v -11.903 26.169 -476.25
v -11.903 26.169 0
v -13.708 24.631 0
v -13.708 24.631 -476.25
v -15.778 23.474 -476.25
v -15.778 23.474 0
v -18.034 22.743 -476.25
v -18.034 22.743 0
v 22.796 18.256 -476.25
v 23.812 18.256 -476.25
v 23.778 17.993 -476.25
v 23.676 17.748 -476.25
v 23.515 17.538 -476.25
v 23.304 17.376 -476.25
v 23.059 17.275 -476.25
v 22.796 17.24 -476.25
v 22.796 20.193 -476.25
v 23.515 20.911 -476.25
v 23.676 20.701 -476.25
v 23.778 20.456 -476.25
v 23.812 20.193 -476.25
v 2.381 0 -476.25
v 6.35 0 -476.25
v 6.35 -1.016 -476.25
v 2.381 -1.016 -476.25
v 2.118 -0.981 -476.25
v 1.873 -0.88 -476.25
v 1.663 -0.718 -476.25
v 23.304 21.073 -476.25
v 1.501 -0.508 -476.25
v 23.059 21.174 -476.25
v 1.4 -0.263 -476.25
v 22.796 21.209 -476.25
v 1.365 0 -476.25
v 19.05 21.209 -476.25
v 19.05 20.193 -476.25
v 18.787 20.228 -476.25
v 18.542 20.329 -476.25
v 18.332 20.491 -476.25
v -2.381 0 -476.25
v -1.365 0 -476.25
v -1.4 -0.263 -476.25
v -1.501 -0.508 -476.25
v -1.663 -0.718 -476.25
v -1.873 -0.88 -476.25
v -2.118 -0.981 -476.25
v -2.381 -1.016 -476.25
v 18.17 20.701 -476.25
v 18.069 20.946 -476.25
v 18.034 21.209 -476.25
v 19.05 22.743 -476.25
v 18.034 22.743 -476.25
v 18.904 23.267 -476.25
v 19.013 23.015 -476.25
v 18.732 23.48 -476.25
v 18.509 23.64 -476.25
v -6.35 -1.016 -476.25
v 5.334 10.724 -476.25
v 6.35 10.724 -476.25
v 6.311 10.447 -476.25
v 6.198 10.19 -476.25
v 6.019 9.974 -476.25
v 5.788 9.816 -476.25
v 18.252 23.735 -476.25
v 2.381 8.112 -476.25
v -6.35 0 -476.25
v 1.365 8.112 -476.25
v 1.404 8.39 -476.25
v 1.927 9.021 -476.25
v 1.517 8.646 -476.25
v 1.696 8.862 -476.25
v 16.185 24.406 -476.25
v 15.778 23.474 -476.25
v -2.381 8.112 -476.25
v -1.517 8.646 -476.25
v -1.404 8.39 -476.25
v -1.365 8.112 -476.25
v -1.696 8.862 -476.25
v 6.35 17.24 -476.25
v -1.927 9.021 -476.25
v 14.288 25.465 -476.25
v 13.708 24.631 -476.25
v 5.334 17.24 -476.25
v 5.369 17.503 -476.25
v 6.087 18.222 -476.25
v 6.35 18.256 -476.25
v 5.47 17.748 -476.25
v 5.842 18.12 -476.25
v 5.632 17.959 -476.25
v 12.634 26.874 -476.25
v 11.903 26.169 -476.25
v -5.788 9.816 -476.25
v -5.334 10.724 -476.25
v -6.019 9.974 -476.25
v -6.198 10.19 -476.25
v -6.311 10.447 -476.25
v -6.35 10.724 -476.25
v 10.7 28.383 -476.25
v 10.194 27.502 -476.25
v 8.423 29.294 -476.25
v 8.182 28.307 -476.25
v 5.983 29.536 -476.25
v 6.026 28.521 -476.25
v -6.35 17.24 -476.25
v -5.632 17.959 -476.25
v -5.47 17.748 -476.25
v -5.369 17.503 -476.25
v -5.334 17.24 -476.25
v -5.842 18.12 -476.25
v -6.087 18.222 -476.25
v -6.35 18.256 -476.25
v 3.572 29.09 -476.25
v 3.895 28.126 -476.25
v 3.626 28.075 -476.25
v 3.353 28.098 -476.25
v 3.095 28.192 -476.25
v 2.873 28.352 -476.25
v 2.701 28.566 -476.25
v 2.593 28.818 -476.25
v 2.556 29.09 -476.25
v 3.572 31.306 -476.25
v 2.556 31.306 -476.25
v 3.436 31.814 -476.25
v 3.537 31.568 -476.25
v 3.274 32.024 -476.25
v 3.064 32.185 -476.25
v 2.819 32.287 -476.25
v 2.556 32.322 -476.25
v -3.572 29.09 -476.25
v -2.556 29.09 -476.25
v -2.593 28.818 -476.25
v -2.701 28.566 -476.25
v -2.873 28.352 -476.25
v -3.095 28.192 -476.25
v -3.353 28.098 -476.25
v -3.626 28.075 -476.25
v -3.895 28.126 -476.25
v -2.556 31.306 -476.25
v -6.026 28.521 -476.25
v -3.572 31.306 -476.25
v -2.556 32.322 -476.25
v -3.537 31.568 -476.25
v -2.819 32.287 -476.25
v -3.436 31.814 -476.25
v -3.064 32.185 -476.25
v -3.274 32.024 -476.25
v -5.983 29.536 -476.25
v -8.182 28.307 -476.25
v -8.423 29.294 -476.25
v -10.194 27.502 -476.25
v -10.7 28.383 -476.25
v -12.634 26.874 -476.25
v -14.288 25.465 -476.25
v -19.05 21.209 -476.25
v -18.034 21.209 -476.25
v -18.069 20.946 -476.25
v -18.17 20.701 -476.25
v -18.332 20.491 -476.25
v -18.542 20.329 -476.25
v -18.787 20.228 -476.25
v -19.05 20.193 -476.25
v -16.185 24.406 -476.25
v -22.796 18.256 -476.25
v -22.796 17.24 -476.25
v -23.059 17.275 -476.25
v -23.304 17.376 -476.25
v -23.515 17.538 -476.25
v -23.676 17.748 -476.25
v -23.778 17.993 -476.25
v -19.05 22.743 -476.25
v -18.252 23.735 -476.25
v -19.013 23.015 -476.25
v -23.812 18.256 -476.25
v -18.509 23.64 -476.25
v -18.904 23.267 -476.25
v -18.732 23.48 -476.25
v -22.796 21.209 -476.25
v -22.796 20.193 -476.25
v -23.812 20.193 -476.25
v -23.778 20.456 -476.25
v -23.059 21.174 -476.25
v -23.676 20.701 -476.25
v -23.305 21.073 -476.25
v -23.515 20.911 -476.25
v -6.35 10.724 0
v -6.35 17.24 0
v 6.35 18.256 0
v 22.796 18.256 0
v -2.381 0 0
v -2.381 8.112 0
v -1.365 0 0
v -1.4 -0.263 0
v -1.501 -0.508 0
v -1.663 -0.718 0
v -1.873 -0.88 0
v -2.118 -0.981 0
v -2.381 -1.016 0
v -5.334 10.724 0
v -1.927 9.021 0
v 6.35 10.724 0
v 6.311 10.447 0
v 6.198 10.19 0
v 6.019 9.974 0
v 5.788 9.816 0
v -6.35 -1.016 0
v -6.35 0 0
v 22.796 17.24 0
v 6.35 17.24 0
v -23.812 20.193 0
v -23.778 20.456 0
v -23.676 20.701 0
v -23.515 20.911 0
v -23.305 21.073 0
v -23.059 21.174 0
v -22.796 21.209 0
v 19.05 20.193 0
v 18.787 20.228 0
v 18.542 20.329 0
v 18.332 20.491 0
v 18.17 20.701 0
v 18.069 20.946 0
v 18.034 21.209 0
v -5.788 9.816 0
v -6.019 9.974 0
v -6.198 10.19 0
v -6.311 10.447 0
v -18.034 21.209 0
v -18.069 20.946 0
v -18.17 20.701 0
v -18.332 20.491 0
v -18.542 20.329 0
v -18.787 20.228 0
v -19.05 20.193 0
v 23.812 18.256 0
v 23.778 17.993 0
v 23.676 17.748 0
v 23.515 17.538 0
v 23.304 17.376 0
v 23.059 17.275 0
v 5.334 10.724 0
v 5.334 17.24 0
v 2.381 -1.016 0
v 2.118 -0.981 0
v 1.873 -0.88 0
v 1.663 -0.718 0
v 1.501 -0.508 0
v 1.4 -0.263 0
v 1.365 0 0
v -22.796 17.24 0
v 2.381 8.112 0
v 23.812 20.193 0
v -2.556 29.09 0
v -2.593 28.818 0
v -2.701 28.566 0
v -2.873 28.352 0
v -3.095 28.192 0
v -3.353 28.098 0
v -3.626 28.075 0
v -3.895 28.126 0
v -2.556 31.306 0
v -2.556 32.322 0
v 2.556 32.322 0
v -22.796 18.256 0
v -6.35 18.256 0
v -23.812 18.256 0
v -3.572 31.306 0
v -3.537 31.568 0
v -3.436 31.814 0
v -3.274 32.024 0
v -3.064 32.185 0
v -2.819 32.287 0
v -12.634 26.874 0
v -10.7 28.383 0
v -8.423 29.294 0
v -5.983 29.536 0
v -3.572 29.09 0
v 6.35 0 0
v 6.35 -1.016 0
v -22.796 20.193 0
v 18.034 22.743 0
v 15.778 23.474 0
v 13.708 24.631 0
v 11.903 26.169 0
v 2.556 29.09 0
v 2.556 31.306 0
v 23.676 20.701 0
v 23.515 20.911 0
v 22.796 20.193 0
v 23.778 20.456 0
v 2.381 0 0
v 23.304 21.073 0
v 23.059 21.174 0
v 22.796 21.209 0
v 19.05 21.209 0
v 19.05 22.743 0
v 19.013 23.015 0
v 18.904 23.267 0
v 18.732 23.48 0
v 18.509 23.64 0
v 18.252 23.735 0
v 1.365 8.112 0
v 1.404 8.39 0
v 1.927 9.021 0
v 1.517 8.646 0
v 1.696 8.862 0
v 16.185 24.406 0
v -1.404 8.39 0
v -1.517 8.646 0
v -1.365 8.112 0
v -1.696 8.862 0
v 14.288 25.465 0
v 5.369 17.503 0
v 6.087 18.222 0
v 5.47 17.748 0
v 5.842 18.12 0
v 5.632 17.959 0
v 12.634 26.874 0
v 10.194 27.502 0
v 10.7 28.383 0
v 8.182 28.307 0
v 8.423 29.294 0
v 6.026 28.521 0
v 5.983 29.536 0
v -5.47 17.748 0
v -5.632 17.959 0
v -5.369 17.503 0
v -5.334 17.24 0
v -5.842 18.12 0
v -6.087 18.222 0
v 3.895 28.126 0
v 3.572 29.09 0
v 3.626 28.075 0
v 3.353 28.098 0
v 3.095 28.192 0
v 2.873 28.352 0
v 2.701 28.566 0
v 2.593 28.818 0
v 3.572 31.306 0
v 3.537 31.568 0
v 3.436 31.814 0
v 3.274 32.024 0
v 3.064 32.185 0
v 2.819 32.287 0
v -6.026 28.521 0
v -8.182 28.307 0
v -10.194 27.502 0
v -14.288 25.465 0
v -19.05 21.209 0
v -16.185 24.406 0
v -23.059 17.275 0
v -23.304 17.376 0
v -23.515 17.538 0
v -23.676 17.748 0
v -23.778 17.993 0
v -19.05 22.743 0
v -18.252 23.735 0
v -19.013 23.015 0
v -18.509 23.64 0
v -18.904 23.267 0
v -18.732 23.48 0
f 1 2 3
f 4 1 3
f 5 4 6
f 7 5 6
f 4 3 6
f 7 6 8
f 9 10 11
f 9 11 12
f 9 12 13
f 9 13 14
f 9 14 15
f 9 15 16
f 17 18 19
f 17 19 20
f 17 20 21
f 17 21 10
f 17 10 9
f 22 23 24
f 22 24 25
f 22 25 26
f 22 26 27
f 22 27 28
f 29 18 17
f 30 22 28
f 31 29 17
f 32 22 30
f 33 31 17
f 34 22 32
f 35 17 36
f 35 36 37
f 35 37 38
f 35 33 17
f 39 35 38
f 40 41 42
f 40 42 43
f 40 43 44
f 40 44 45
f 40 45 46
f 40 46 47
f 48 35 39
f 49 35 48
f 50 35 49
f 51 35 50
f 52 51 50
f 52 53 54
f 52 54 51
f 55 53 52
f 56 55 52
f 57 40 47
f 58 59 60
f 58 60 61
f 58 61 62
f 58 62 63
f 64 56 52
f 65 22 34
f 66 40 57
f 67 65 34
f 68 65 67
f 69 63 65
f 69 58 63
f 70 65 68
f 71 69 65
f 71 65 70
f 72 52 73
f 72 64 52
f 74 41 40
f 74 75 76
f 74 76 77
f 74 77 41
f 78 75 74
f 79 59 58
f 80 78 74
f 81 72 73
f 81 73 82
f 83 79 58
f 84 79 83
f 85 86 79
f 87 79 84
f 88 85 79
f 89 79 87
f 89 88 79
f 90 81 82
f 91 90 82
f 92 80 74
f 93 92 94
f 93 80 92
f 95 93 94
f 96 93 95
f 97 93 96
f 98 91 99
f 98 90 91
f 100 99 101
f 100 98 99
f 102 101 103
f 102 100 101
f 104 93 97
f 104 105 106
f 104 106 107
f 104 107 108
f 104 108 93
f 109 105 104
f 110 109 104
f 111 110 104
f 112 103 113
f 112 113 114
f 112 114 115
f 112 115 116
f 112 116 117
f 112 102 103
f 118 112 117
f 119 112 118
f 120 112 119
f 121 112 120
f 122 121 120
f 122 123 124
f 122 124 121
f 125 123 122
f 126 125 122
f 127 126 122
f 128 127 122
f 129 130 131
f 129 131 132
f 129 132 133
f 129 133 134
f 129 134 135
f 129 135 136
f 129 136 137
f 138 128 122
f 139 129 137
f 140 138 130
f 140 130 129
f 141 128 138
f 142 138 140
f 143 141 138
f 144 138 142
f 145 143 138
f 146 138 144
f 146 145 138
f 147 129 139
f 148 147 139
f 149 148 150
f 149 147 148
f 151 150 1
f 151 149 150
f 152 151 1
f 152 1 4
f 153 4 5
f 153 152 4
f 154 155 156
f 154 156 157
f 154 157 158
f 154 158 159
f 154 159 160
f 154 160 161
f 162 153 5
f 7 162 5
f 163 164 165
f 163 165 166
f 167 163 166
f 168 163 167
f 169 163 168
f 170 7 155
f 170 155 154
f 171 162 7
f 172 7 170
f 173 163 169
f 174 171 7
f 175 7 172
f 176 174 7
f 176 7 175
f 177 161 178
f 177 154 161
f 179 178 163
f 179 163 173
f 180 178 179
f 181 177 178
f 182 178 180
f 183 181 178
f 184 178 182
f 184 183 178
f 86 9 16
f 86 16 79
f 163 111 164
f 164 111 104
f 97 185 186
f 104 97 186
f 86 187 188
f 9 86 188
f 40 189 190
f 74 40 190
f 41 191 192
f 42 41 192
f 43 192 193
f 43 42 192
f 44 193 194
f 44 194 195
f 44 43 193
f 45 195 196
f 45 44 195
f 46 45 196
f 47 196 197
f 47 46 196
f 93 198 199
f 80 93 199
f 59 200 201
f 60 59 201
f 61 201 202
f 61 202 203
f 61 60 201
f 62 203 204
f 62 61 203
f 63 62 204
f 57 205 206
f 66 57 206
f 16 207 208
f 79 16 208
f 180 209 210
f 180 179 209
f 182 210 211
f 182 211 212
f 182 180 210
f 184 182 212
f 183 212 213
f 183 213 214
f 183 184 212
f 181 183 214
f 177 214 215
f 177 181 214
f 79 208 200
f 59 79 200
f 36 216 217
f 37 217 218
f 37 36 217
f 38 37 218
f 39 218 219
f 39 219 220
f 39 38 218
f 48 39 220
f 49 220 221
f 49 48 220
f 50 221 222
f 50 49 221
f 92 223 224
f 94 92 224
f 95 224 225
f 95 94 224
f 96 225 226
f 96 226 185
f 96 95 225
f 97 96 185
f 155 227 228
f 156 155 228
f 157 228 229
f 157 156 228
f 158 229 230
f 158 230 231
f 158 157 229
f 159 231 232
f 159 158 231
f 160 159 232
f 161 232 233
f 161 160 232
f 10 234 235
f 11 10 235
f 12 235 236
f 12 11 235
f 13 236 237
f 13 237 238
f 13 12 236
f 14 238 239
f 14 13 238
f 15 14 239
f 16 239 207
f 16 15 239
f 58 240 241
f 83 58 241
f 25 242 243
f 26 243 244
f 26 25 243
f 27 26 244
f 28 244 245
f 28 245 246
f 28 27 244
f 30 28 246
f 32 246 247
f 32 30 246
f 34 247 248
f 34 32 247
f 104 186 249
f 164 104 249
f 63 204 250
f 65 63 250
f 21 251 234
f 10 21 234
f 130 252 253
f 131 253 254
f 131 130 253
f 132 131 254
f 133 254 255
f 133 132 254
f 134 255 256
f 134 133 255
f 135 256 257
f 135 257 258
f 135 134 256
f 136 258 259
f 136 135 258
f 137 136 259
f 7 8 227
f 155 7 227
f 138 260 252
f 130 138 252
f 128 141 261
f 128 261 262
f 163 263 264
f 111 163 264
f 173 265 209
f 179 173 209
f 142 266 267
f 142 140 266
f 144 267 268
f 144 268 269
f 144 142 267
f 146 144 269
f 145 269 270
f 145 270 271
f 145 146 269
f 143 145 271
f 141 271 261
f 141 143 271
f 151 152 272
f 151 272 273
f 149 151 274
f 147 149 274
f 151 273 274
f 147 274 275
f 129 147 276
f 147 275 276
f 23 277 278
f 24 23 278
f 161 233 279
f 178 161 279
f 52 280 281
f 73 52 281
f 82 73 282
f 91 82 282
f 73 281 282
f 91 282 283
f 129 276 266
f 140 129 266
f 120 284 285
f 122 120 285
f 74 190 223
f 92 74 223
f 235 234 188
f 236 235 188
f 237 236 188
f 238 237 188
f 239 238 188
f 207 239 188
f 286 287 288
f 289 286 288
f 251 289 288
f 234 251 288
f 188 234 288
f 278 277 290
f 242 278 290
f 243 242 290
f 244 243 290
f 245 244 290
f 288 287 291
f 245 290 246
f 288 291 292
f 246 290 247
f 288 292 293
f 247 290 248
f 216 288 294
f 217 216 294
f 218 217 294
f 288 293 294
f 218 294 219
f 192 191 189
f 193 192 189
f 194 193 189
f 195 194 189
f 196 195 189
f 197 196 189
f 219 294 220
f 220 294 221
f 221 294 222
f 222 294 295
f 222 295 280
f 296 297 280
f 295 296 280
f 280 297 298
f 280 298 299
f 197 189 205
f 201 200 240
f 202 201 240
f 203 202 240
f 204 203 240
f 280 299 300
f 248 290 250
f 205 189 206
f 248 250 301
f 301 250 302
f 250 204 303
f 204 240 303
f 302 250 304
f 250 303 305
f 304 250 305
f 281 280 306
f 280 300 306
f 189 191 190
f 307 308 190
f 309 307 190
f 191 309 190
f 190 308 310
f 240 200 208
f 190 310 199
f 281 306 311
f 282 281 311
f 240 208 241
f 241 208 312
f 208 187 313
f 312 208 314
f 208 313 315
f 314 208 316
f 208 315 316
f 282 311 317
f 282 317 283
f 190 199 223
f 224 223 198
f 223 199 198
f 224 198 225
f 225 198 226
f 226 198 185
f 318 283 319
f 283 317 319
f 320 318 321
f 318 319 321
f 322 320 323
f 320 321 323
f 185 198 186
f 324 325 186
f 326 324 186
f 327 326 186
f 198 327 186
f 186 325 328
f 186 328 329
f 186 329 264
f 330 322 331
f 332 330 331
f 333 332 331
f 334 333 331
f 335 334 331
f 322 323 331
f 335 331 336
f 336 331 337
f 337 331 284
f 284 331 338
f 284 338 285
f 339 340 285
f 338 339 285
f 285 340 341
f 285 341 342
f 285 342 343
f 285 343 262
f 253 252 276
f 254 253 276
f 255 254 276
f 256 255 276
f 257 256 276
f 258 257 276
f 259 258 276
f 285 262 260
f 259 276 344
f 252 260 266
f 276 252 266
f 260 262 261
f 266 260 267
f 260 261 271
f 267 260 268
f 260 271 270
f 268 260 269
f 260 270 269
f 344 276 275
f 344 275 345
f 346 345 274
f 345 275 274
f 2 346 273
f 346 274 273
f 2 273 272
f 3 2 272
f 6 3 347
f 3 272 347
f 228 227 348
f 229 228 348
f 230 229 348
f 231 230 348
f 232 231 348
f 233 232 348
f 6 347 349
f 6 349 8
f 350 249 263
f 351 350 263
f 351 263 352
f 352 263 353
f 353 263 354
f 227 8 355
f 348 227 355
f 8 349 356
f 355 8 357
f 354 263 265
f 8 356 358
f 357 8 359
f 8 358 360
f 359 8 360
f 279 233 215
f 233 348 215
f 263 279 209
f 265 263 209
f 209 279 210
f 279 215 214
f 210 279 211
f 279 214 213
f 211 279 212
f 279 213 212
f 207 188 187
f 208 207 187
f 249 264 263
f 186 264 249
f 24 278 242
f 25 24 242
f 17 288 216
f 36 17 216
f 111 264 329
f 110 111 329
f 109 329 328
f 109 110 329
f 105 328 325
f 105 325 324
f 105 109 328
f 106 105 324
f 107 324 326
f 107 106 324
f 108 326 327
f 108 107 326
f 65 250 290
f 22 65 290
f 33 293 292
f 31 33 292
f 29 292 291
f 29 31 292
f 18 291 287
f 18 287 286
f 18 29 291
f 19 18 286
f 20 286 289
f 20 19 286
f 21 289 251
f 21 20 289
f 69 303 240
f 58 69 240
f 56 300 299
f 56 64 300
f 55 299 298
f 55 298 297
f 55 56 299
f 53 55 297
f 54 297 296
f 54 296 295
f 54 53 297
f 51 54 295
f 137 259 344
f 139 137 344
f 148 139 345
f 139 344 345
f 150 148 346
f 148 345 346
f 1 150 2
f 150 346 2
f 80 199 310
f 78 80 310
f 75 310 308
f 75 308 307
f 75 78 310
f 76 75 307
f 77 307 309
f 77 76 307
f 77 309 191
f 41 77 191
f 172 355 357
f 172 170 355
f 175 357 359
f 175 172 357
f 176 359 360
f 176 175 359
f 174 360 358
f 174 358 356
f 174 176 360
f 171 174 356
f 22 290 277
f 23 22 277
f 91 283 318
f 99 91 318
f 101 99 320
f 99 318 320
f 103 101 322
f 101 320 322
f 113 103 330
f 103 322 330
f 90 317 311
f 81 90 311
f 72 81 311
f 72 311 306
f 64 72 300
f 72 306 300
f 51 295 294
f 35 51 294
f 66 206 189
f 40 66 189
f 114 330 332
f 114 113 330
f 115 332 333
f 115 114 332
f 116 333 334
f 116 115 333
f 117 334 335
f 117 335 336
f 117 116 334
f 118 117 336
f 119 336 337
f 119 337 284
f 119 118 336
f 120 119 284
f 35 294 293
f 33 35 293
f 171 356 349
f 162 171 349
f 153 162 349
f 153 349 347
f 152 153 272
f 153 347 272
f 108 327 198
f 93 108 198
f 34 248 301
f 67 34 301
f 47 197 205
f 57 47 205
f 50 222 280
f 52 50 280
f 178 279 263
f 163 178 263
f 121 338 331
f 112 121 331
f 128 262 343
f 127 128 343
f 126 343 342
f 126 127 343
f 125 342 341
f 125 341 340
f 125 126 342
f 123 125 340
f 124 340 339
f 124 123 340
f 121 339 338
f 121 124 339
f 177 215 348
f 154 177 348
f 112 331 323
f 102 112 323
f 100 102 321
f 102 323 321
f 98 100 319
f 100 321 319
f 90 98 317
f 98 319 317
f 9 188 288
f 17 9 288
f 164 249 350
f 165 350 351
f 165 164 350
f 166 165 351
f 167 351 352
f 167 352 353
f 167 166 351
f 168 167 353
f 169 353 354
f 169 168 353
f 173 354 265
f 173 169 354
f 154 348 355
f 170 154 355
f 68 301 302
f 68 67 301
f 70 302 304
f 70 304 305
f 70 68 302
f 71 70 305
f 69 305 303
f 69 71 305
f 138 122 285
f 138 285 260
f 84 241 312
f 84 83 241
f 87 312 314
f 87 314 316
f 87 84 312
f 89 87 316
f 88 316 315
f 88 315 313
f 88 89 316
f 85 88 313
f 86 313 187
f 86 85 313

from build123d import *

# Parameters (mm, degrees)
EXTRUDE_THIN2_DEPTH = 476.25
FILLET1_R           = 1.016


with BuildPart() as part:
    # Sketch1 → Extrude-Thin2 (new body)
    with BuildSketch(Plane.XY):
        with BuildLine():
            Line((-6.35, 0), (-2.38125, 0))
            Line((-2.38125, 0), (-2.38125, 8.112125))
            Line((-2.38125, 8.112125), (-6.35, 10.0965))
            Line((-6.35, 10.0965), (-6.35, 17.24025))
            Line((-6.35, 17.24025), (-23.8125, 17.24025))
            Line((-23.8125, 17.24025), (-23.8125, 21.209))
            Line((-23.8125, 21.209), (-19.05, 21.209))
            Line((-19.05, 21.209), (-19.05, 23.59025))
            ThreePointArc((-19.05, 23.59025), (-15.568214533, 24.697581116), (-12.633740801, 26.874247409))
            ThreePointArc((-12.633740801, 26.874247409), (-8.42347359, 29.293600923), (-3.571875, 29.089609403))
            Line((-3.571875, 29.089609403), (-3.571875, 32.3215))
            Line((-3.571875, 32.3215), (3.571875, 32.3215))
            Line((3.571875, 32.3215), (3.571875, 29.089609403))
            ThreePointArc((3.571875, 29.089609403), (8.42347359, 29.293600923), (12.633740801, 26.874247409))
            ThreePointArc((12.633740801, 26.874247409), (15.568214533, 24.697581116), (19.05, 23.59025))
            Line((19.05, 23.59025), (19.05, 21.209))
            Line((19.05, 21.209), (23.8125, 21.209))
            Line((23.8125, 21.209), (23.8125, 17.24025))
            Line((23.8125, 17.24025), (6.35, 17.24025))
            Line((6.35, 17.24025), (6.35, 10.0965))
            Line((6.35, 10.0965), (2.38125, 8.112125))
            Line((2.38125, 8.112125), (2.38125, 0))
            Line((2.38125, 0), (6.35, 0))
            Line((6.35, 0), (6.35, -1.016))
            Line((6.35, -1.016), (1.36525, -1.016))
            Line((1.36525, -1.016), (1.36525, 8.740047533))
            Line((1.36525, 8.740047533), (5.334, 10.724422533))
            Line((5.334, 10.724422533), (5.334, 18.25625))
            Line((5.334, 18.25625), (22.7965, 18.25625))
            Line((22.7965, 18.25625), (22.7965, 20.193))
            Line((22.7965, 20.193), (18.034, 20.193))
            Line((18.034, 20.193), (18.034, 22.742528034))
            ThreePointArc((18.034, 22.742528034), (14.714811847, 24.002111564), (11.902541871, 26.168836802))
            ThreePointArc((11.902541871, 26.168836802), (7.461841431, 28.446841183), (2.555875, 27.529989099))
            Line((2.555875, 27.529989099), (2.555875, 31.3055))
            Line((2.555875, 31.3055), (-2.555875, 31.3055))
            Line((-2.555875, 31.3055), (-2.555875, 27.529989099))
            ThreePointArc((-2.555875, 27.529989099), (-7.461841431, 28.446841183), (-11.902541871, 26.168836802))
            ThreePointArc((-11.902541871, 26.168836802), (-14.714811847, 24.002111564), (-18.034, 22.742528034))
            Line((-18.034, 22.742528034), (-18.034, 20.193))
            Line((-18.034, 20.193), (-22.7965, 20.193))
            Line((-22.7965, 20.193), (-22.7965, 18.25625))
            Line((-22.7965, 18.25625), (-5.334, 18.25625))
            Line((-5.334, 18.25625), (-5.334, 10.724422533))
            Line((-5.334, 10.724422533), (-1.36525, 8.740047533))
            Line((-1.36525, 8.740047533), (-1.36525, -1.016))
            Line((-1.36525, -1.016), (-6.35, -1.016))
            Line((-6.35, -1.016), (-6.35, 0))
        make_face()
    extrude(amount=-EXTRUDE_THIN2_DEPTH)

    # Fillet1
    fillet1_edges = [part.edges().sort_by_distance(p)[0] for p in [
        (-6.35, 10.0965, -238.125),
        (-23.8125, 17.24025, -238.125),
        (-23.8125, 21.209, -238.125),
        (-19.05, 23.59025, -238.125),
        (-3.571875, 32.3215, -238.125),
        (3.571875, 32.3215, -238.125),
        (19.05, 23.59025, -238.125),
        (23.8125, 21.209, -238.125),
        (23.8125, 17.24025, -238.125),
        (6.35, 10.0965, -238.125),
        (1.36525, -1.016, -238.125),
        (1.36525, 8.740047533, -238.125),
        (5.334, 18.25625, -238.125),
        (18.034, 20.193, -238.125),
        (2.555875, 27.529989099, -238.125),
        (-2.555875, 27.529989099, -238.125),
        (-18.034, 20.193, -238.125),
        (-5.334, 18.25625, -238.125),
        (-1.36525, 8.740047533, -238.125),
        (-1.36525, -1.016, -238.125),
    ]]
    fillet(fillet1_edges, radius=FILLET1_R)


solid = part.part
